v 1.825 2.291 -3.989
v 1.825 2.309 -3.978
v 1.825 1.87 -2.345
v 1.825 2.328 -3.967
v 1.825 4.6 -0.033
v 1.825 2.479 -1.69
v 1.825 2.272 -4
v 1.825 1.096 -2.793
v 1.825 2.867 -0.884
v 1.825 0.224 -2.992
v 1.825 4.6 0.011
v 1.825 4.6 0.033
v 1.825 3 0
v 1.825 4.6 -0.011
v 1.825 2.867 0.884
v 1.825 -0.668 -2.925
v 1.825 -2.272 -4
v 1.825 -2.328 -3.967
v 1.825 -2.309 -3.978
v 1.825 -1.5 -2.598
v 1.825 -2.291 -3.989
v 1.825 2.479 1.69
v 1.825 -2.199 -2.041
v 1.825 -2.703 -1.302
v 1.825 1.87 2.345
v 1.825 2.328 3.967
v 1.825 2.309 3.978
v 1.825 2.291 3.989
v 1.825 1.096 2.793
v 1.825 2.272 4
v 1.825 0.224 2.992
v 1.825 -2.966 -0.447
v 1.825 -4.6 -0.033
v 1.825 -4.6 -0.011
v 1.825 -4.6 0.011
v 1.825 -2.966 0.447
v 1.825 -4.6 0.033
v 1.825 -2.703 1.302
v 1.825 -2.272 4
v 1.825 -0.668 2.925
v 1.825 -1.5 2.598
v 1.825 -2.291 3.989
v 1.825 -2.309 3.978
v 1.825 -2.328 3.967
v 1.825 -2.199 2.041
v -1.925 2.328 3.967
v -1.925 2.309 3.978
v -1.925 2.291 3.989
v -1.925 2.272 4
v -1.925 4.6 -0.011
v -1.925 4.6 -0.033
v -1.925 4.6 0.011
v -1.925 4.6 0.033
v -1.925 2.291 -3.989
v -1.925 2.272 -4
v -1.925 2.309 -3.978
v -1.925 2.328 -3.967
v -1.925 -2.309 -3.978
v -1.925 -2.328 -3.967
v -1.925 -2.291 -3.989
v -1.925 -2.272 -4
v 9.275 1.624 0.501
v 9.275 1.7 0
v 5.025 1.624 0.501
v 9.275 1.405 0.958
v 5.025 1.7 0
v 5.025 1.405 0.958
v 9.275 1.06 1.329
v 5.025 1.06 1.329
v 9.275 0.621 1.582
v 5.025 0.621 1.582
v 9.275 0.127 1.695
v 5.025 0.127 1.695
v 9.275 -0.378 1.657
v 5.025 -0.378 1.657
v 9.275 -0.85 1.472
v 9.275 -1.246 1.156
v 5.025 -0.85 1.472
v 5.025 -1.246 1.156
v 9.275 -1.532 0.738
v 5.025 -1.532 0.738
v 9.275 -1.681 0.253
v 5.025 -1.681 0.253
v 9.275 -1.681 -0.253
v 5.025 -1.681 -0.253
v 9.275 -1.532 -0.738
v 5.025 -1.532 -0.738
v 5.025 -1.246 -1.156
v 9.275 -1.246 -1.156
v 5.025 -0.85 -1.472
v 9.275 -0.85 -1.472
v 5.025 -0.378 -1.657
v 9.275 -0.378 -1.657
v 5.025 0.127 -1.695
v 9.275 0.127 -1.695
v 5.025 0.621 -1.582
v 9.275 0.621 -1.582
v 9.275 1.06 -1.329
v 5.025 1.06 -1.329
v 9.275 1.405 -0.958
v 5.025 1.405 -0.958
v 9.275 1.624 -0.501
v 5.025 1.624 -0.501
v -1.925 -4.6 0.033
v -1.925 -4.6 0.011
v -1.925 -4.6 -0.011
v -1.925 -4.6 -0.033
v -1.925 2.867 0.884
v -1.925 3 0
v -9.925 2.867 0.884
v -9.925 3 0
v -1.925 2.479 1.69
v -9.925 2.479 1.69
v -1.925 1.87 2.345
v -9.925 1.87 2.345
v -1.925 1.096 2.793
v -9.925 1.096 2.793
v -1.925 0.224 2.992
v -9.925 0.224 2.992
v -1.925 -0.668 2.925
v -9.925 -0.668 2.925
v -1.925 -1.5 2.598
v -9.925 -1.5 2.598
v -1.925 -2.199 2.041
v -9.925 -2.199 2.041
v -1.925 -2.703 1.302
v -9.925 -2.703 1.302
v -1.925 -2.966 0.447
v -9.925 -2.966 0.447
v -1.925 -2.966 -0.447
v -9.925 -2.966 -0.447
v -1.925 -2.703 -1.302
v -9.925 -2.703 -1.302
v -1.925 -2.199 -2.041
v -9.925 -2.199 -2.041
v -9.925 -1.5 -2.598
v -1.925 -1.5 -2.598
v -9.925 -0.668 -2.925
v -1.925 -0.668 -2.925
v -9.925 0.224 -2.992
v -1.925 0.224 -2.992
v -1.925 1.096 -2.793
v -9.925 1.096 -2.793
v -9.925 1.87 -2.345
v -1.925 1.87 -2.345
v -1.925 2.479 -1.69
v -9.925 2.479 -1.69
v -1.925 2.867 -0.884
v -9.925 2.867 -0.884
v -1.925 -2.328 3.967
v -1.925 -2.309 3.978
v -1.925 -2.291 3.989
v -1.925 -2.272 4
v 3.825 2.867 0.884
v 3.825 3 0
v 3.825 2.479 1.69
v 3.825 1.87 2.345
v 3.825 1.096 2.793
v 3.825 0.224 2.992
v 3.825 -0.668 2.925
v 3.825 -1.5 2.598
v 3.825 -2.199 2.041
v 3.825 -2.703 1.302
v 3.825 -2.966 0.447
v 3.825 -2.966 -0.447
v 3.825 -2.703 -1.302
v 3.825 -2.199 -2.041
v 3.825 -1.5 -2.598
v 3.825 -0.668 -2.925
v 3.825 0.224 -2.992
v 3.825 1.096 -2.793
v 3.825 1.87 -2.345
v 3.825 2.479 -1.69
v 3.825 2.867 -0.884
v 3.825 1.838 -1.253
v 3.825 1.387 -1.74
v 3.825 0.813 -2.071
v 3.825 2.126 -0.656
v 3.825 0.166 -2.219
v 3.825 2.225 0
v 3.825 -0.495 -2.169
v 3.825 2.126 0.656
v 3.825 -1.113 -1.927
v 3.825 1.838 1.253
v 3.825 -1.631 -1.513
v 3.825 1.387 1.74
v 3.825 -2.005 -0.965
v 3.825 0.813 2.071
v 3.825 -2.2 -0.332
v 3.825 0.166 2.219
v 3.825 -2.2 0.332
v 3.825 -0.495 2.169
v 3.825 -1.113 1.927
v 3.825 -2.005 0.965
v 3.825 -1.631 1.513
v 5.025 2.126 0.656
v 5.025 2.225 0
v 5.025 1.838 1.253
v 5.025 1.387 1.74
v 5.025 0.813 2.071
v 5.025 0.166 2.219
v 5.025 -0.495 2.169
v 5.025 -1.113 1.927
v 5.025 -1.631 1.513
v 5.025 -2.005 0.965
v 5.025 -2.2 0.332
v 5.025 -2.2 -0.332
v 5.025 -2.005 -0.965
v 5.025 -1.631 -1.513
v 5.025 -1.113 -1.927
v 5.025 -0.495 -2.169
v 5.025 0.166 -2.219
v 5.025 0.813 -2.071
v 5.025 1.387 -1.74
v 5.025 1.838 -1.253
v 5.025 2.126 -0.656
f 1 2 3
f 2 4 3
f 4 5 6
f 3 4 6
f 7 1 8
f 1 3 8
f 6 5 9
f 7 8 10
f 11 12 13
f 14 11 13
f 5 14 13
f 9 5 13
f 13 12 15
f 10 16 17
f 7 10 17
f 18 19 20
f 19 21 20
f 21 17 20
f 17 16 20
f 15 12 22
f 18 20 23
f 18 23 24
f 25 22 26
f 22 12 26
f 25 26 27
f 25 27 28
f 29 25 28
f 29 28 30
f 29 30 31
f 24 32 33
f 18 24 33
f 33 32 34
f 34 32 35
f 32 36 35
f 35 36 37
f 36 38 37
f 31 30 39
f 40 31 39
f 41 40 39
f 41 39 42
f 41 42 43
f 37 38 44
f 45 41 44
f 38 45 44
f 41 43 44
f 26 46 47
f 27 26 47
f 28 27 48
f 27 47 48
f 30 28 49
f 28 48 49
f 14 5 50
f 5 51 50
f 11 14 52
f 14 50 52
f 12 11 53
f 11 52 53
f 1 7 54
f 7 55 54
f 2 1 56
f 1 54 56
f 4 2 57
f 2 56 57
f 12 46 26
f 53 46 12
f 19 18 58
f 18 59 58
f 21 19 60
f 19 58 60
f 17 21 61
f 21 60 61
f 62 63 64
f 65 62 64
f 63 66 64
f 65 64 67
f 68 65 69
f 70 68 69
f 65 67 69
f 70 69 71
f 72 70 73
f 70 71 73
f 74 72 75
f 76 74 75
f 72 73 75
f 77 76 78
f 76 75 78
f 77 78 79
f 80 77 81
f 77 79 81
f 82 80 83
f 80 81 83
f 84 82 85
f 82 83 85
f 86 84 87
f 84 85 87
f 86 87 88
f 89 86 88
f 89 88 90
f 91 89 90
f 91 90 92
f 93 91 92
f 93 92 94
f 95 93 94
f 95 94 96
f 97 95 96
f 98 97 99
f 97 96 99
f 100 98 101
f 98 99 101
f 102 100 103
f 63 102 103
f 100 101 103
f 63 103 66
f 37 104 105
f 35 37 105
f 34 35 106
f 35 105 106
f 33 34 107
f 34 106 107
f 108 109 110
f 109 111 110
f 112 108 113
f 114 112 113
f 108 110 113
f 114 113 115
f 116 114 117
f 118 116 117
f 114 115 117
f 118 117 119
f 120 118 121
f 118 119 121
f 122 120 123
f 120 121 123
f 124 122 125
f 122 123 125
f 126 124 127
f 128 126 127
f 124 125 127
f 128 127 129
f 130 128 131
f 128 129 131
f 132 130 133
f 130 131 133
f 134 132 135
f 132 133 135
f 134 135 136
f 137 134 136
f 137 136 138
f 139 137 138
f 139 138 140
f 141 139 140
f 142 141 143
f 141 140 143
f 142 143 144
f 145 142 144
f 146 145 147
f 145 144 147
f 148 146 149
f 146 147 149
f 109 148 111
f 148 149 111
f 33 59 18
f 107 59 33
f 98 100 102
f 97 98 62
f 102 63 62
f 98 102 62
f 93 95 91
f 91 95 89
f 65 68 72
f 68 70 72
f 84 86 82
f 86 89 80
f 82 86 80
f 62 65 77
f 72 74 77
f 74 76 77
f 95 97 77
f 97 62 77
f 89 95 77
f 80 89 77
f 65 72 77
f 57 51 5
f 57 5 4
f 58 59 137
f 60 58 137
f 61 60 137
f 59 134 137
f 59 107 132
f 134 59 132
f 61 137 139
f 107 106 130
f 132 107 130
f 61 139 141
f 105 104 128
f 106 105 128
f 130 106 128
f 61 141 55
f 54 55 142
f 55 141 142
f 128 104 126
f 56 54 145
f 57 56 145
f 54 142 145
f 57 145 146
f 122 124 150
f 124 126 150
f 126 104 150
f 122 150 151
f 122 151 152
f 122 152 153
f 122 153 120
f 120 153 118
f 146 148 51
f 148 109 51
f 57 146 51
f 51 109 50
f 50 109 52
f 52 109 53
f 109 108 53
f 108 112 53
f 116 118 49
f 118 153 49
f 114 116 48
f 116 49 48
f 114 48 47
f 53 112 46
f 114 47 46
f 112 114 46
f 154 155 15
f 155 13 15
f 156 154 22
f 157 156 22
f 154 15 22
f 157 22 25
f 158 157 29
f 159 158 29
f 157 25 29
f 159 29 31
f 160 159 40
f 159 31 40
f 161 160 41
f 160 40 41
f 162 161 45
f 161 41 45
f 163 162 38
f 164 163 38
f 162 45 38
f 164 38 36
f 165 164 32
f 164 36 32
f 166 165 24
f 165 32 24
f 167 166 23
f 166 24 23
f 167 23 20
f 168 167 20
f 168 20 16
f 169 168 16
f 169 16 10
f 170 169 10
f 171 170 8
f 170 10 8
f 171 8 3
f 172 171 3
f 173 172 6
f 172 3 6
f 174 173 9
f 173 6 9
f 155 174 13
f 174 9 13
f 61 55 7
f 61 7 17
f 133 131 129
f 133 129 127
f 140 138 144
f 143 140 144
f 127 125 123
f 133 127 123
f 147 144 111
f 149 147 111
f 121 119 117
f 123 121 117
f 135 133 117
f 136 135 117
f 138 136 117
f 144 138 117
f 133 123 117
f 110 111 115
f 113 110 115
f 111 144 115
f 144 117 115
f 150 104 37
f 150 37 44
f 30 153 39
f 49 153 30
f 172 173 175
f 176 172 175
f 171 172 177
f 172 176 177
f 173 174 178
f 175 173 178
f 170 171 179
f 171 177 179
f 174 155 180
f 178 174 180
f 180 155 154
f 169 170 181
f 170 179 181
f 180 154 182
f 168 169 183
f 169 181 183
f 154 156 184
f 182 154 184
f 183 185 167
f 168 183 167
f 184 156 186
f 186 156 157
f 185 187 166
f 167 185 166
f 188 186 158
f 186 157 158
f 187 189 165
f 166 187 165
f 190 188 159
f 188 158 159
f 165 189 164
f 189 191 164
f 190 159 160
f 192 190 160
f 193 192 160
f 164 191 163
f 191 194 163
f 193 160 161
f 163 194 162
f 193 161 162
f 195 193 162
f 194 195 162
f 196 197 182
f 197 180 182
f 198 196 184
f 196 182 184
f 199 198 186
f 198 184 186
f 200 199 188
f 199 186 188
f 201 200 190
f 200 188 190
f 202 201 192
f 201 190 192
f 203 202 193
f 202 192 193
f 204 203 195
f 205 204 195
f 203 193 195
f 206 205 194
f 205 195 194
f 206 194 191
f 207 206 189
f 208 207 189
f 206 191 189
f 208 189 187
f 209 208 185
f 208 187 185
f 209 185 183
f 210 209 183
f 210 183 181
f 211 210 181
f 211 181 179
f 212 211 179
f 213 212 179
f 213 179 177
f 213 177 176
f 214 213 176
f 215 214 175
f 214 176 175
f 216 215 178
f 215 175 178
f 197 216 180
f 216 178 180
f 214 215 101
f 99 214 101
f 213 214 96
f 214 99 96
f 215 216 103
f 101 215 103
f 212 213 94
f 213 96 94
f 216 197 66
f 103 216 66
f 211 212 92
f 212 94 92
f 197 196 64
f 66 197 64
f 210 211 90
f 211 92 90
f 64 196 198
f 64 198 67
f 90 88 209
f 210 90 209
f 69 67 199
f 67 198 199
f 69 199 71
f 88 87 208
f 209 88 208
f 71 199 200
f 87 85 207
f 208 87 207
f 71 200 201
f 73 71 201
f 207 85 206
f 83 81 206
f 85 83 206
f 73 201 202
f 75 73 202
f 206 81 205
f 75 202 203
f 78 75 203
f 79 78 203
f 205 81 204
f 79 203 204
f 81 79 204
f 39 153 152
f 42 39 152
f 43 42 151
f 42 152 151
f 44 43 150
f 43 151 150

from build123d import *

# Parameters (mm, degrees)
F3_START = 13.9
F3_DEPTH = 38.9


with BuildPart() as f1:
    # F0 (on Top) → F1 (revolve)
    with BuildSketch(Plane.XY):
        Polygon((-9.9245372606, 3), (-9.9245372606, 0), (9.2754627394, 0), (9.2754627394, 1.7), (5.0254627394, 1.7), (5.0254627394, 2.225), (3.8254627394, 2.225), (3.8254627394, 3), (1.8254627394, 3), (1.8254627394, 4.6), (-1.9245372606, 4.6), (-1.9245372606, 3), align=None)
    revolve(axis=Axis((-0.3245372606, 0, 0), (1, 0, 0)))

    # F2 (on face) → F3 (intersect)
    with BuildSketch(Plane(origin=(-1.9245372606, 0, 0), x_dir=(0, -1, 0), z_dir=(-1, 0, 0)).offset(F3_START)):
        Polygon((2.3094010768, 4), (-2.3094010768, 4), (-4.6188021535, 0), (-2.3094010768, -4), (2.3094010768, -4), (4.6188021535, 0), align=None)
    extrude(amount=-F3_DEPTH, mode=Mode.INTERSECT)


solid = f1.part
